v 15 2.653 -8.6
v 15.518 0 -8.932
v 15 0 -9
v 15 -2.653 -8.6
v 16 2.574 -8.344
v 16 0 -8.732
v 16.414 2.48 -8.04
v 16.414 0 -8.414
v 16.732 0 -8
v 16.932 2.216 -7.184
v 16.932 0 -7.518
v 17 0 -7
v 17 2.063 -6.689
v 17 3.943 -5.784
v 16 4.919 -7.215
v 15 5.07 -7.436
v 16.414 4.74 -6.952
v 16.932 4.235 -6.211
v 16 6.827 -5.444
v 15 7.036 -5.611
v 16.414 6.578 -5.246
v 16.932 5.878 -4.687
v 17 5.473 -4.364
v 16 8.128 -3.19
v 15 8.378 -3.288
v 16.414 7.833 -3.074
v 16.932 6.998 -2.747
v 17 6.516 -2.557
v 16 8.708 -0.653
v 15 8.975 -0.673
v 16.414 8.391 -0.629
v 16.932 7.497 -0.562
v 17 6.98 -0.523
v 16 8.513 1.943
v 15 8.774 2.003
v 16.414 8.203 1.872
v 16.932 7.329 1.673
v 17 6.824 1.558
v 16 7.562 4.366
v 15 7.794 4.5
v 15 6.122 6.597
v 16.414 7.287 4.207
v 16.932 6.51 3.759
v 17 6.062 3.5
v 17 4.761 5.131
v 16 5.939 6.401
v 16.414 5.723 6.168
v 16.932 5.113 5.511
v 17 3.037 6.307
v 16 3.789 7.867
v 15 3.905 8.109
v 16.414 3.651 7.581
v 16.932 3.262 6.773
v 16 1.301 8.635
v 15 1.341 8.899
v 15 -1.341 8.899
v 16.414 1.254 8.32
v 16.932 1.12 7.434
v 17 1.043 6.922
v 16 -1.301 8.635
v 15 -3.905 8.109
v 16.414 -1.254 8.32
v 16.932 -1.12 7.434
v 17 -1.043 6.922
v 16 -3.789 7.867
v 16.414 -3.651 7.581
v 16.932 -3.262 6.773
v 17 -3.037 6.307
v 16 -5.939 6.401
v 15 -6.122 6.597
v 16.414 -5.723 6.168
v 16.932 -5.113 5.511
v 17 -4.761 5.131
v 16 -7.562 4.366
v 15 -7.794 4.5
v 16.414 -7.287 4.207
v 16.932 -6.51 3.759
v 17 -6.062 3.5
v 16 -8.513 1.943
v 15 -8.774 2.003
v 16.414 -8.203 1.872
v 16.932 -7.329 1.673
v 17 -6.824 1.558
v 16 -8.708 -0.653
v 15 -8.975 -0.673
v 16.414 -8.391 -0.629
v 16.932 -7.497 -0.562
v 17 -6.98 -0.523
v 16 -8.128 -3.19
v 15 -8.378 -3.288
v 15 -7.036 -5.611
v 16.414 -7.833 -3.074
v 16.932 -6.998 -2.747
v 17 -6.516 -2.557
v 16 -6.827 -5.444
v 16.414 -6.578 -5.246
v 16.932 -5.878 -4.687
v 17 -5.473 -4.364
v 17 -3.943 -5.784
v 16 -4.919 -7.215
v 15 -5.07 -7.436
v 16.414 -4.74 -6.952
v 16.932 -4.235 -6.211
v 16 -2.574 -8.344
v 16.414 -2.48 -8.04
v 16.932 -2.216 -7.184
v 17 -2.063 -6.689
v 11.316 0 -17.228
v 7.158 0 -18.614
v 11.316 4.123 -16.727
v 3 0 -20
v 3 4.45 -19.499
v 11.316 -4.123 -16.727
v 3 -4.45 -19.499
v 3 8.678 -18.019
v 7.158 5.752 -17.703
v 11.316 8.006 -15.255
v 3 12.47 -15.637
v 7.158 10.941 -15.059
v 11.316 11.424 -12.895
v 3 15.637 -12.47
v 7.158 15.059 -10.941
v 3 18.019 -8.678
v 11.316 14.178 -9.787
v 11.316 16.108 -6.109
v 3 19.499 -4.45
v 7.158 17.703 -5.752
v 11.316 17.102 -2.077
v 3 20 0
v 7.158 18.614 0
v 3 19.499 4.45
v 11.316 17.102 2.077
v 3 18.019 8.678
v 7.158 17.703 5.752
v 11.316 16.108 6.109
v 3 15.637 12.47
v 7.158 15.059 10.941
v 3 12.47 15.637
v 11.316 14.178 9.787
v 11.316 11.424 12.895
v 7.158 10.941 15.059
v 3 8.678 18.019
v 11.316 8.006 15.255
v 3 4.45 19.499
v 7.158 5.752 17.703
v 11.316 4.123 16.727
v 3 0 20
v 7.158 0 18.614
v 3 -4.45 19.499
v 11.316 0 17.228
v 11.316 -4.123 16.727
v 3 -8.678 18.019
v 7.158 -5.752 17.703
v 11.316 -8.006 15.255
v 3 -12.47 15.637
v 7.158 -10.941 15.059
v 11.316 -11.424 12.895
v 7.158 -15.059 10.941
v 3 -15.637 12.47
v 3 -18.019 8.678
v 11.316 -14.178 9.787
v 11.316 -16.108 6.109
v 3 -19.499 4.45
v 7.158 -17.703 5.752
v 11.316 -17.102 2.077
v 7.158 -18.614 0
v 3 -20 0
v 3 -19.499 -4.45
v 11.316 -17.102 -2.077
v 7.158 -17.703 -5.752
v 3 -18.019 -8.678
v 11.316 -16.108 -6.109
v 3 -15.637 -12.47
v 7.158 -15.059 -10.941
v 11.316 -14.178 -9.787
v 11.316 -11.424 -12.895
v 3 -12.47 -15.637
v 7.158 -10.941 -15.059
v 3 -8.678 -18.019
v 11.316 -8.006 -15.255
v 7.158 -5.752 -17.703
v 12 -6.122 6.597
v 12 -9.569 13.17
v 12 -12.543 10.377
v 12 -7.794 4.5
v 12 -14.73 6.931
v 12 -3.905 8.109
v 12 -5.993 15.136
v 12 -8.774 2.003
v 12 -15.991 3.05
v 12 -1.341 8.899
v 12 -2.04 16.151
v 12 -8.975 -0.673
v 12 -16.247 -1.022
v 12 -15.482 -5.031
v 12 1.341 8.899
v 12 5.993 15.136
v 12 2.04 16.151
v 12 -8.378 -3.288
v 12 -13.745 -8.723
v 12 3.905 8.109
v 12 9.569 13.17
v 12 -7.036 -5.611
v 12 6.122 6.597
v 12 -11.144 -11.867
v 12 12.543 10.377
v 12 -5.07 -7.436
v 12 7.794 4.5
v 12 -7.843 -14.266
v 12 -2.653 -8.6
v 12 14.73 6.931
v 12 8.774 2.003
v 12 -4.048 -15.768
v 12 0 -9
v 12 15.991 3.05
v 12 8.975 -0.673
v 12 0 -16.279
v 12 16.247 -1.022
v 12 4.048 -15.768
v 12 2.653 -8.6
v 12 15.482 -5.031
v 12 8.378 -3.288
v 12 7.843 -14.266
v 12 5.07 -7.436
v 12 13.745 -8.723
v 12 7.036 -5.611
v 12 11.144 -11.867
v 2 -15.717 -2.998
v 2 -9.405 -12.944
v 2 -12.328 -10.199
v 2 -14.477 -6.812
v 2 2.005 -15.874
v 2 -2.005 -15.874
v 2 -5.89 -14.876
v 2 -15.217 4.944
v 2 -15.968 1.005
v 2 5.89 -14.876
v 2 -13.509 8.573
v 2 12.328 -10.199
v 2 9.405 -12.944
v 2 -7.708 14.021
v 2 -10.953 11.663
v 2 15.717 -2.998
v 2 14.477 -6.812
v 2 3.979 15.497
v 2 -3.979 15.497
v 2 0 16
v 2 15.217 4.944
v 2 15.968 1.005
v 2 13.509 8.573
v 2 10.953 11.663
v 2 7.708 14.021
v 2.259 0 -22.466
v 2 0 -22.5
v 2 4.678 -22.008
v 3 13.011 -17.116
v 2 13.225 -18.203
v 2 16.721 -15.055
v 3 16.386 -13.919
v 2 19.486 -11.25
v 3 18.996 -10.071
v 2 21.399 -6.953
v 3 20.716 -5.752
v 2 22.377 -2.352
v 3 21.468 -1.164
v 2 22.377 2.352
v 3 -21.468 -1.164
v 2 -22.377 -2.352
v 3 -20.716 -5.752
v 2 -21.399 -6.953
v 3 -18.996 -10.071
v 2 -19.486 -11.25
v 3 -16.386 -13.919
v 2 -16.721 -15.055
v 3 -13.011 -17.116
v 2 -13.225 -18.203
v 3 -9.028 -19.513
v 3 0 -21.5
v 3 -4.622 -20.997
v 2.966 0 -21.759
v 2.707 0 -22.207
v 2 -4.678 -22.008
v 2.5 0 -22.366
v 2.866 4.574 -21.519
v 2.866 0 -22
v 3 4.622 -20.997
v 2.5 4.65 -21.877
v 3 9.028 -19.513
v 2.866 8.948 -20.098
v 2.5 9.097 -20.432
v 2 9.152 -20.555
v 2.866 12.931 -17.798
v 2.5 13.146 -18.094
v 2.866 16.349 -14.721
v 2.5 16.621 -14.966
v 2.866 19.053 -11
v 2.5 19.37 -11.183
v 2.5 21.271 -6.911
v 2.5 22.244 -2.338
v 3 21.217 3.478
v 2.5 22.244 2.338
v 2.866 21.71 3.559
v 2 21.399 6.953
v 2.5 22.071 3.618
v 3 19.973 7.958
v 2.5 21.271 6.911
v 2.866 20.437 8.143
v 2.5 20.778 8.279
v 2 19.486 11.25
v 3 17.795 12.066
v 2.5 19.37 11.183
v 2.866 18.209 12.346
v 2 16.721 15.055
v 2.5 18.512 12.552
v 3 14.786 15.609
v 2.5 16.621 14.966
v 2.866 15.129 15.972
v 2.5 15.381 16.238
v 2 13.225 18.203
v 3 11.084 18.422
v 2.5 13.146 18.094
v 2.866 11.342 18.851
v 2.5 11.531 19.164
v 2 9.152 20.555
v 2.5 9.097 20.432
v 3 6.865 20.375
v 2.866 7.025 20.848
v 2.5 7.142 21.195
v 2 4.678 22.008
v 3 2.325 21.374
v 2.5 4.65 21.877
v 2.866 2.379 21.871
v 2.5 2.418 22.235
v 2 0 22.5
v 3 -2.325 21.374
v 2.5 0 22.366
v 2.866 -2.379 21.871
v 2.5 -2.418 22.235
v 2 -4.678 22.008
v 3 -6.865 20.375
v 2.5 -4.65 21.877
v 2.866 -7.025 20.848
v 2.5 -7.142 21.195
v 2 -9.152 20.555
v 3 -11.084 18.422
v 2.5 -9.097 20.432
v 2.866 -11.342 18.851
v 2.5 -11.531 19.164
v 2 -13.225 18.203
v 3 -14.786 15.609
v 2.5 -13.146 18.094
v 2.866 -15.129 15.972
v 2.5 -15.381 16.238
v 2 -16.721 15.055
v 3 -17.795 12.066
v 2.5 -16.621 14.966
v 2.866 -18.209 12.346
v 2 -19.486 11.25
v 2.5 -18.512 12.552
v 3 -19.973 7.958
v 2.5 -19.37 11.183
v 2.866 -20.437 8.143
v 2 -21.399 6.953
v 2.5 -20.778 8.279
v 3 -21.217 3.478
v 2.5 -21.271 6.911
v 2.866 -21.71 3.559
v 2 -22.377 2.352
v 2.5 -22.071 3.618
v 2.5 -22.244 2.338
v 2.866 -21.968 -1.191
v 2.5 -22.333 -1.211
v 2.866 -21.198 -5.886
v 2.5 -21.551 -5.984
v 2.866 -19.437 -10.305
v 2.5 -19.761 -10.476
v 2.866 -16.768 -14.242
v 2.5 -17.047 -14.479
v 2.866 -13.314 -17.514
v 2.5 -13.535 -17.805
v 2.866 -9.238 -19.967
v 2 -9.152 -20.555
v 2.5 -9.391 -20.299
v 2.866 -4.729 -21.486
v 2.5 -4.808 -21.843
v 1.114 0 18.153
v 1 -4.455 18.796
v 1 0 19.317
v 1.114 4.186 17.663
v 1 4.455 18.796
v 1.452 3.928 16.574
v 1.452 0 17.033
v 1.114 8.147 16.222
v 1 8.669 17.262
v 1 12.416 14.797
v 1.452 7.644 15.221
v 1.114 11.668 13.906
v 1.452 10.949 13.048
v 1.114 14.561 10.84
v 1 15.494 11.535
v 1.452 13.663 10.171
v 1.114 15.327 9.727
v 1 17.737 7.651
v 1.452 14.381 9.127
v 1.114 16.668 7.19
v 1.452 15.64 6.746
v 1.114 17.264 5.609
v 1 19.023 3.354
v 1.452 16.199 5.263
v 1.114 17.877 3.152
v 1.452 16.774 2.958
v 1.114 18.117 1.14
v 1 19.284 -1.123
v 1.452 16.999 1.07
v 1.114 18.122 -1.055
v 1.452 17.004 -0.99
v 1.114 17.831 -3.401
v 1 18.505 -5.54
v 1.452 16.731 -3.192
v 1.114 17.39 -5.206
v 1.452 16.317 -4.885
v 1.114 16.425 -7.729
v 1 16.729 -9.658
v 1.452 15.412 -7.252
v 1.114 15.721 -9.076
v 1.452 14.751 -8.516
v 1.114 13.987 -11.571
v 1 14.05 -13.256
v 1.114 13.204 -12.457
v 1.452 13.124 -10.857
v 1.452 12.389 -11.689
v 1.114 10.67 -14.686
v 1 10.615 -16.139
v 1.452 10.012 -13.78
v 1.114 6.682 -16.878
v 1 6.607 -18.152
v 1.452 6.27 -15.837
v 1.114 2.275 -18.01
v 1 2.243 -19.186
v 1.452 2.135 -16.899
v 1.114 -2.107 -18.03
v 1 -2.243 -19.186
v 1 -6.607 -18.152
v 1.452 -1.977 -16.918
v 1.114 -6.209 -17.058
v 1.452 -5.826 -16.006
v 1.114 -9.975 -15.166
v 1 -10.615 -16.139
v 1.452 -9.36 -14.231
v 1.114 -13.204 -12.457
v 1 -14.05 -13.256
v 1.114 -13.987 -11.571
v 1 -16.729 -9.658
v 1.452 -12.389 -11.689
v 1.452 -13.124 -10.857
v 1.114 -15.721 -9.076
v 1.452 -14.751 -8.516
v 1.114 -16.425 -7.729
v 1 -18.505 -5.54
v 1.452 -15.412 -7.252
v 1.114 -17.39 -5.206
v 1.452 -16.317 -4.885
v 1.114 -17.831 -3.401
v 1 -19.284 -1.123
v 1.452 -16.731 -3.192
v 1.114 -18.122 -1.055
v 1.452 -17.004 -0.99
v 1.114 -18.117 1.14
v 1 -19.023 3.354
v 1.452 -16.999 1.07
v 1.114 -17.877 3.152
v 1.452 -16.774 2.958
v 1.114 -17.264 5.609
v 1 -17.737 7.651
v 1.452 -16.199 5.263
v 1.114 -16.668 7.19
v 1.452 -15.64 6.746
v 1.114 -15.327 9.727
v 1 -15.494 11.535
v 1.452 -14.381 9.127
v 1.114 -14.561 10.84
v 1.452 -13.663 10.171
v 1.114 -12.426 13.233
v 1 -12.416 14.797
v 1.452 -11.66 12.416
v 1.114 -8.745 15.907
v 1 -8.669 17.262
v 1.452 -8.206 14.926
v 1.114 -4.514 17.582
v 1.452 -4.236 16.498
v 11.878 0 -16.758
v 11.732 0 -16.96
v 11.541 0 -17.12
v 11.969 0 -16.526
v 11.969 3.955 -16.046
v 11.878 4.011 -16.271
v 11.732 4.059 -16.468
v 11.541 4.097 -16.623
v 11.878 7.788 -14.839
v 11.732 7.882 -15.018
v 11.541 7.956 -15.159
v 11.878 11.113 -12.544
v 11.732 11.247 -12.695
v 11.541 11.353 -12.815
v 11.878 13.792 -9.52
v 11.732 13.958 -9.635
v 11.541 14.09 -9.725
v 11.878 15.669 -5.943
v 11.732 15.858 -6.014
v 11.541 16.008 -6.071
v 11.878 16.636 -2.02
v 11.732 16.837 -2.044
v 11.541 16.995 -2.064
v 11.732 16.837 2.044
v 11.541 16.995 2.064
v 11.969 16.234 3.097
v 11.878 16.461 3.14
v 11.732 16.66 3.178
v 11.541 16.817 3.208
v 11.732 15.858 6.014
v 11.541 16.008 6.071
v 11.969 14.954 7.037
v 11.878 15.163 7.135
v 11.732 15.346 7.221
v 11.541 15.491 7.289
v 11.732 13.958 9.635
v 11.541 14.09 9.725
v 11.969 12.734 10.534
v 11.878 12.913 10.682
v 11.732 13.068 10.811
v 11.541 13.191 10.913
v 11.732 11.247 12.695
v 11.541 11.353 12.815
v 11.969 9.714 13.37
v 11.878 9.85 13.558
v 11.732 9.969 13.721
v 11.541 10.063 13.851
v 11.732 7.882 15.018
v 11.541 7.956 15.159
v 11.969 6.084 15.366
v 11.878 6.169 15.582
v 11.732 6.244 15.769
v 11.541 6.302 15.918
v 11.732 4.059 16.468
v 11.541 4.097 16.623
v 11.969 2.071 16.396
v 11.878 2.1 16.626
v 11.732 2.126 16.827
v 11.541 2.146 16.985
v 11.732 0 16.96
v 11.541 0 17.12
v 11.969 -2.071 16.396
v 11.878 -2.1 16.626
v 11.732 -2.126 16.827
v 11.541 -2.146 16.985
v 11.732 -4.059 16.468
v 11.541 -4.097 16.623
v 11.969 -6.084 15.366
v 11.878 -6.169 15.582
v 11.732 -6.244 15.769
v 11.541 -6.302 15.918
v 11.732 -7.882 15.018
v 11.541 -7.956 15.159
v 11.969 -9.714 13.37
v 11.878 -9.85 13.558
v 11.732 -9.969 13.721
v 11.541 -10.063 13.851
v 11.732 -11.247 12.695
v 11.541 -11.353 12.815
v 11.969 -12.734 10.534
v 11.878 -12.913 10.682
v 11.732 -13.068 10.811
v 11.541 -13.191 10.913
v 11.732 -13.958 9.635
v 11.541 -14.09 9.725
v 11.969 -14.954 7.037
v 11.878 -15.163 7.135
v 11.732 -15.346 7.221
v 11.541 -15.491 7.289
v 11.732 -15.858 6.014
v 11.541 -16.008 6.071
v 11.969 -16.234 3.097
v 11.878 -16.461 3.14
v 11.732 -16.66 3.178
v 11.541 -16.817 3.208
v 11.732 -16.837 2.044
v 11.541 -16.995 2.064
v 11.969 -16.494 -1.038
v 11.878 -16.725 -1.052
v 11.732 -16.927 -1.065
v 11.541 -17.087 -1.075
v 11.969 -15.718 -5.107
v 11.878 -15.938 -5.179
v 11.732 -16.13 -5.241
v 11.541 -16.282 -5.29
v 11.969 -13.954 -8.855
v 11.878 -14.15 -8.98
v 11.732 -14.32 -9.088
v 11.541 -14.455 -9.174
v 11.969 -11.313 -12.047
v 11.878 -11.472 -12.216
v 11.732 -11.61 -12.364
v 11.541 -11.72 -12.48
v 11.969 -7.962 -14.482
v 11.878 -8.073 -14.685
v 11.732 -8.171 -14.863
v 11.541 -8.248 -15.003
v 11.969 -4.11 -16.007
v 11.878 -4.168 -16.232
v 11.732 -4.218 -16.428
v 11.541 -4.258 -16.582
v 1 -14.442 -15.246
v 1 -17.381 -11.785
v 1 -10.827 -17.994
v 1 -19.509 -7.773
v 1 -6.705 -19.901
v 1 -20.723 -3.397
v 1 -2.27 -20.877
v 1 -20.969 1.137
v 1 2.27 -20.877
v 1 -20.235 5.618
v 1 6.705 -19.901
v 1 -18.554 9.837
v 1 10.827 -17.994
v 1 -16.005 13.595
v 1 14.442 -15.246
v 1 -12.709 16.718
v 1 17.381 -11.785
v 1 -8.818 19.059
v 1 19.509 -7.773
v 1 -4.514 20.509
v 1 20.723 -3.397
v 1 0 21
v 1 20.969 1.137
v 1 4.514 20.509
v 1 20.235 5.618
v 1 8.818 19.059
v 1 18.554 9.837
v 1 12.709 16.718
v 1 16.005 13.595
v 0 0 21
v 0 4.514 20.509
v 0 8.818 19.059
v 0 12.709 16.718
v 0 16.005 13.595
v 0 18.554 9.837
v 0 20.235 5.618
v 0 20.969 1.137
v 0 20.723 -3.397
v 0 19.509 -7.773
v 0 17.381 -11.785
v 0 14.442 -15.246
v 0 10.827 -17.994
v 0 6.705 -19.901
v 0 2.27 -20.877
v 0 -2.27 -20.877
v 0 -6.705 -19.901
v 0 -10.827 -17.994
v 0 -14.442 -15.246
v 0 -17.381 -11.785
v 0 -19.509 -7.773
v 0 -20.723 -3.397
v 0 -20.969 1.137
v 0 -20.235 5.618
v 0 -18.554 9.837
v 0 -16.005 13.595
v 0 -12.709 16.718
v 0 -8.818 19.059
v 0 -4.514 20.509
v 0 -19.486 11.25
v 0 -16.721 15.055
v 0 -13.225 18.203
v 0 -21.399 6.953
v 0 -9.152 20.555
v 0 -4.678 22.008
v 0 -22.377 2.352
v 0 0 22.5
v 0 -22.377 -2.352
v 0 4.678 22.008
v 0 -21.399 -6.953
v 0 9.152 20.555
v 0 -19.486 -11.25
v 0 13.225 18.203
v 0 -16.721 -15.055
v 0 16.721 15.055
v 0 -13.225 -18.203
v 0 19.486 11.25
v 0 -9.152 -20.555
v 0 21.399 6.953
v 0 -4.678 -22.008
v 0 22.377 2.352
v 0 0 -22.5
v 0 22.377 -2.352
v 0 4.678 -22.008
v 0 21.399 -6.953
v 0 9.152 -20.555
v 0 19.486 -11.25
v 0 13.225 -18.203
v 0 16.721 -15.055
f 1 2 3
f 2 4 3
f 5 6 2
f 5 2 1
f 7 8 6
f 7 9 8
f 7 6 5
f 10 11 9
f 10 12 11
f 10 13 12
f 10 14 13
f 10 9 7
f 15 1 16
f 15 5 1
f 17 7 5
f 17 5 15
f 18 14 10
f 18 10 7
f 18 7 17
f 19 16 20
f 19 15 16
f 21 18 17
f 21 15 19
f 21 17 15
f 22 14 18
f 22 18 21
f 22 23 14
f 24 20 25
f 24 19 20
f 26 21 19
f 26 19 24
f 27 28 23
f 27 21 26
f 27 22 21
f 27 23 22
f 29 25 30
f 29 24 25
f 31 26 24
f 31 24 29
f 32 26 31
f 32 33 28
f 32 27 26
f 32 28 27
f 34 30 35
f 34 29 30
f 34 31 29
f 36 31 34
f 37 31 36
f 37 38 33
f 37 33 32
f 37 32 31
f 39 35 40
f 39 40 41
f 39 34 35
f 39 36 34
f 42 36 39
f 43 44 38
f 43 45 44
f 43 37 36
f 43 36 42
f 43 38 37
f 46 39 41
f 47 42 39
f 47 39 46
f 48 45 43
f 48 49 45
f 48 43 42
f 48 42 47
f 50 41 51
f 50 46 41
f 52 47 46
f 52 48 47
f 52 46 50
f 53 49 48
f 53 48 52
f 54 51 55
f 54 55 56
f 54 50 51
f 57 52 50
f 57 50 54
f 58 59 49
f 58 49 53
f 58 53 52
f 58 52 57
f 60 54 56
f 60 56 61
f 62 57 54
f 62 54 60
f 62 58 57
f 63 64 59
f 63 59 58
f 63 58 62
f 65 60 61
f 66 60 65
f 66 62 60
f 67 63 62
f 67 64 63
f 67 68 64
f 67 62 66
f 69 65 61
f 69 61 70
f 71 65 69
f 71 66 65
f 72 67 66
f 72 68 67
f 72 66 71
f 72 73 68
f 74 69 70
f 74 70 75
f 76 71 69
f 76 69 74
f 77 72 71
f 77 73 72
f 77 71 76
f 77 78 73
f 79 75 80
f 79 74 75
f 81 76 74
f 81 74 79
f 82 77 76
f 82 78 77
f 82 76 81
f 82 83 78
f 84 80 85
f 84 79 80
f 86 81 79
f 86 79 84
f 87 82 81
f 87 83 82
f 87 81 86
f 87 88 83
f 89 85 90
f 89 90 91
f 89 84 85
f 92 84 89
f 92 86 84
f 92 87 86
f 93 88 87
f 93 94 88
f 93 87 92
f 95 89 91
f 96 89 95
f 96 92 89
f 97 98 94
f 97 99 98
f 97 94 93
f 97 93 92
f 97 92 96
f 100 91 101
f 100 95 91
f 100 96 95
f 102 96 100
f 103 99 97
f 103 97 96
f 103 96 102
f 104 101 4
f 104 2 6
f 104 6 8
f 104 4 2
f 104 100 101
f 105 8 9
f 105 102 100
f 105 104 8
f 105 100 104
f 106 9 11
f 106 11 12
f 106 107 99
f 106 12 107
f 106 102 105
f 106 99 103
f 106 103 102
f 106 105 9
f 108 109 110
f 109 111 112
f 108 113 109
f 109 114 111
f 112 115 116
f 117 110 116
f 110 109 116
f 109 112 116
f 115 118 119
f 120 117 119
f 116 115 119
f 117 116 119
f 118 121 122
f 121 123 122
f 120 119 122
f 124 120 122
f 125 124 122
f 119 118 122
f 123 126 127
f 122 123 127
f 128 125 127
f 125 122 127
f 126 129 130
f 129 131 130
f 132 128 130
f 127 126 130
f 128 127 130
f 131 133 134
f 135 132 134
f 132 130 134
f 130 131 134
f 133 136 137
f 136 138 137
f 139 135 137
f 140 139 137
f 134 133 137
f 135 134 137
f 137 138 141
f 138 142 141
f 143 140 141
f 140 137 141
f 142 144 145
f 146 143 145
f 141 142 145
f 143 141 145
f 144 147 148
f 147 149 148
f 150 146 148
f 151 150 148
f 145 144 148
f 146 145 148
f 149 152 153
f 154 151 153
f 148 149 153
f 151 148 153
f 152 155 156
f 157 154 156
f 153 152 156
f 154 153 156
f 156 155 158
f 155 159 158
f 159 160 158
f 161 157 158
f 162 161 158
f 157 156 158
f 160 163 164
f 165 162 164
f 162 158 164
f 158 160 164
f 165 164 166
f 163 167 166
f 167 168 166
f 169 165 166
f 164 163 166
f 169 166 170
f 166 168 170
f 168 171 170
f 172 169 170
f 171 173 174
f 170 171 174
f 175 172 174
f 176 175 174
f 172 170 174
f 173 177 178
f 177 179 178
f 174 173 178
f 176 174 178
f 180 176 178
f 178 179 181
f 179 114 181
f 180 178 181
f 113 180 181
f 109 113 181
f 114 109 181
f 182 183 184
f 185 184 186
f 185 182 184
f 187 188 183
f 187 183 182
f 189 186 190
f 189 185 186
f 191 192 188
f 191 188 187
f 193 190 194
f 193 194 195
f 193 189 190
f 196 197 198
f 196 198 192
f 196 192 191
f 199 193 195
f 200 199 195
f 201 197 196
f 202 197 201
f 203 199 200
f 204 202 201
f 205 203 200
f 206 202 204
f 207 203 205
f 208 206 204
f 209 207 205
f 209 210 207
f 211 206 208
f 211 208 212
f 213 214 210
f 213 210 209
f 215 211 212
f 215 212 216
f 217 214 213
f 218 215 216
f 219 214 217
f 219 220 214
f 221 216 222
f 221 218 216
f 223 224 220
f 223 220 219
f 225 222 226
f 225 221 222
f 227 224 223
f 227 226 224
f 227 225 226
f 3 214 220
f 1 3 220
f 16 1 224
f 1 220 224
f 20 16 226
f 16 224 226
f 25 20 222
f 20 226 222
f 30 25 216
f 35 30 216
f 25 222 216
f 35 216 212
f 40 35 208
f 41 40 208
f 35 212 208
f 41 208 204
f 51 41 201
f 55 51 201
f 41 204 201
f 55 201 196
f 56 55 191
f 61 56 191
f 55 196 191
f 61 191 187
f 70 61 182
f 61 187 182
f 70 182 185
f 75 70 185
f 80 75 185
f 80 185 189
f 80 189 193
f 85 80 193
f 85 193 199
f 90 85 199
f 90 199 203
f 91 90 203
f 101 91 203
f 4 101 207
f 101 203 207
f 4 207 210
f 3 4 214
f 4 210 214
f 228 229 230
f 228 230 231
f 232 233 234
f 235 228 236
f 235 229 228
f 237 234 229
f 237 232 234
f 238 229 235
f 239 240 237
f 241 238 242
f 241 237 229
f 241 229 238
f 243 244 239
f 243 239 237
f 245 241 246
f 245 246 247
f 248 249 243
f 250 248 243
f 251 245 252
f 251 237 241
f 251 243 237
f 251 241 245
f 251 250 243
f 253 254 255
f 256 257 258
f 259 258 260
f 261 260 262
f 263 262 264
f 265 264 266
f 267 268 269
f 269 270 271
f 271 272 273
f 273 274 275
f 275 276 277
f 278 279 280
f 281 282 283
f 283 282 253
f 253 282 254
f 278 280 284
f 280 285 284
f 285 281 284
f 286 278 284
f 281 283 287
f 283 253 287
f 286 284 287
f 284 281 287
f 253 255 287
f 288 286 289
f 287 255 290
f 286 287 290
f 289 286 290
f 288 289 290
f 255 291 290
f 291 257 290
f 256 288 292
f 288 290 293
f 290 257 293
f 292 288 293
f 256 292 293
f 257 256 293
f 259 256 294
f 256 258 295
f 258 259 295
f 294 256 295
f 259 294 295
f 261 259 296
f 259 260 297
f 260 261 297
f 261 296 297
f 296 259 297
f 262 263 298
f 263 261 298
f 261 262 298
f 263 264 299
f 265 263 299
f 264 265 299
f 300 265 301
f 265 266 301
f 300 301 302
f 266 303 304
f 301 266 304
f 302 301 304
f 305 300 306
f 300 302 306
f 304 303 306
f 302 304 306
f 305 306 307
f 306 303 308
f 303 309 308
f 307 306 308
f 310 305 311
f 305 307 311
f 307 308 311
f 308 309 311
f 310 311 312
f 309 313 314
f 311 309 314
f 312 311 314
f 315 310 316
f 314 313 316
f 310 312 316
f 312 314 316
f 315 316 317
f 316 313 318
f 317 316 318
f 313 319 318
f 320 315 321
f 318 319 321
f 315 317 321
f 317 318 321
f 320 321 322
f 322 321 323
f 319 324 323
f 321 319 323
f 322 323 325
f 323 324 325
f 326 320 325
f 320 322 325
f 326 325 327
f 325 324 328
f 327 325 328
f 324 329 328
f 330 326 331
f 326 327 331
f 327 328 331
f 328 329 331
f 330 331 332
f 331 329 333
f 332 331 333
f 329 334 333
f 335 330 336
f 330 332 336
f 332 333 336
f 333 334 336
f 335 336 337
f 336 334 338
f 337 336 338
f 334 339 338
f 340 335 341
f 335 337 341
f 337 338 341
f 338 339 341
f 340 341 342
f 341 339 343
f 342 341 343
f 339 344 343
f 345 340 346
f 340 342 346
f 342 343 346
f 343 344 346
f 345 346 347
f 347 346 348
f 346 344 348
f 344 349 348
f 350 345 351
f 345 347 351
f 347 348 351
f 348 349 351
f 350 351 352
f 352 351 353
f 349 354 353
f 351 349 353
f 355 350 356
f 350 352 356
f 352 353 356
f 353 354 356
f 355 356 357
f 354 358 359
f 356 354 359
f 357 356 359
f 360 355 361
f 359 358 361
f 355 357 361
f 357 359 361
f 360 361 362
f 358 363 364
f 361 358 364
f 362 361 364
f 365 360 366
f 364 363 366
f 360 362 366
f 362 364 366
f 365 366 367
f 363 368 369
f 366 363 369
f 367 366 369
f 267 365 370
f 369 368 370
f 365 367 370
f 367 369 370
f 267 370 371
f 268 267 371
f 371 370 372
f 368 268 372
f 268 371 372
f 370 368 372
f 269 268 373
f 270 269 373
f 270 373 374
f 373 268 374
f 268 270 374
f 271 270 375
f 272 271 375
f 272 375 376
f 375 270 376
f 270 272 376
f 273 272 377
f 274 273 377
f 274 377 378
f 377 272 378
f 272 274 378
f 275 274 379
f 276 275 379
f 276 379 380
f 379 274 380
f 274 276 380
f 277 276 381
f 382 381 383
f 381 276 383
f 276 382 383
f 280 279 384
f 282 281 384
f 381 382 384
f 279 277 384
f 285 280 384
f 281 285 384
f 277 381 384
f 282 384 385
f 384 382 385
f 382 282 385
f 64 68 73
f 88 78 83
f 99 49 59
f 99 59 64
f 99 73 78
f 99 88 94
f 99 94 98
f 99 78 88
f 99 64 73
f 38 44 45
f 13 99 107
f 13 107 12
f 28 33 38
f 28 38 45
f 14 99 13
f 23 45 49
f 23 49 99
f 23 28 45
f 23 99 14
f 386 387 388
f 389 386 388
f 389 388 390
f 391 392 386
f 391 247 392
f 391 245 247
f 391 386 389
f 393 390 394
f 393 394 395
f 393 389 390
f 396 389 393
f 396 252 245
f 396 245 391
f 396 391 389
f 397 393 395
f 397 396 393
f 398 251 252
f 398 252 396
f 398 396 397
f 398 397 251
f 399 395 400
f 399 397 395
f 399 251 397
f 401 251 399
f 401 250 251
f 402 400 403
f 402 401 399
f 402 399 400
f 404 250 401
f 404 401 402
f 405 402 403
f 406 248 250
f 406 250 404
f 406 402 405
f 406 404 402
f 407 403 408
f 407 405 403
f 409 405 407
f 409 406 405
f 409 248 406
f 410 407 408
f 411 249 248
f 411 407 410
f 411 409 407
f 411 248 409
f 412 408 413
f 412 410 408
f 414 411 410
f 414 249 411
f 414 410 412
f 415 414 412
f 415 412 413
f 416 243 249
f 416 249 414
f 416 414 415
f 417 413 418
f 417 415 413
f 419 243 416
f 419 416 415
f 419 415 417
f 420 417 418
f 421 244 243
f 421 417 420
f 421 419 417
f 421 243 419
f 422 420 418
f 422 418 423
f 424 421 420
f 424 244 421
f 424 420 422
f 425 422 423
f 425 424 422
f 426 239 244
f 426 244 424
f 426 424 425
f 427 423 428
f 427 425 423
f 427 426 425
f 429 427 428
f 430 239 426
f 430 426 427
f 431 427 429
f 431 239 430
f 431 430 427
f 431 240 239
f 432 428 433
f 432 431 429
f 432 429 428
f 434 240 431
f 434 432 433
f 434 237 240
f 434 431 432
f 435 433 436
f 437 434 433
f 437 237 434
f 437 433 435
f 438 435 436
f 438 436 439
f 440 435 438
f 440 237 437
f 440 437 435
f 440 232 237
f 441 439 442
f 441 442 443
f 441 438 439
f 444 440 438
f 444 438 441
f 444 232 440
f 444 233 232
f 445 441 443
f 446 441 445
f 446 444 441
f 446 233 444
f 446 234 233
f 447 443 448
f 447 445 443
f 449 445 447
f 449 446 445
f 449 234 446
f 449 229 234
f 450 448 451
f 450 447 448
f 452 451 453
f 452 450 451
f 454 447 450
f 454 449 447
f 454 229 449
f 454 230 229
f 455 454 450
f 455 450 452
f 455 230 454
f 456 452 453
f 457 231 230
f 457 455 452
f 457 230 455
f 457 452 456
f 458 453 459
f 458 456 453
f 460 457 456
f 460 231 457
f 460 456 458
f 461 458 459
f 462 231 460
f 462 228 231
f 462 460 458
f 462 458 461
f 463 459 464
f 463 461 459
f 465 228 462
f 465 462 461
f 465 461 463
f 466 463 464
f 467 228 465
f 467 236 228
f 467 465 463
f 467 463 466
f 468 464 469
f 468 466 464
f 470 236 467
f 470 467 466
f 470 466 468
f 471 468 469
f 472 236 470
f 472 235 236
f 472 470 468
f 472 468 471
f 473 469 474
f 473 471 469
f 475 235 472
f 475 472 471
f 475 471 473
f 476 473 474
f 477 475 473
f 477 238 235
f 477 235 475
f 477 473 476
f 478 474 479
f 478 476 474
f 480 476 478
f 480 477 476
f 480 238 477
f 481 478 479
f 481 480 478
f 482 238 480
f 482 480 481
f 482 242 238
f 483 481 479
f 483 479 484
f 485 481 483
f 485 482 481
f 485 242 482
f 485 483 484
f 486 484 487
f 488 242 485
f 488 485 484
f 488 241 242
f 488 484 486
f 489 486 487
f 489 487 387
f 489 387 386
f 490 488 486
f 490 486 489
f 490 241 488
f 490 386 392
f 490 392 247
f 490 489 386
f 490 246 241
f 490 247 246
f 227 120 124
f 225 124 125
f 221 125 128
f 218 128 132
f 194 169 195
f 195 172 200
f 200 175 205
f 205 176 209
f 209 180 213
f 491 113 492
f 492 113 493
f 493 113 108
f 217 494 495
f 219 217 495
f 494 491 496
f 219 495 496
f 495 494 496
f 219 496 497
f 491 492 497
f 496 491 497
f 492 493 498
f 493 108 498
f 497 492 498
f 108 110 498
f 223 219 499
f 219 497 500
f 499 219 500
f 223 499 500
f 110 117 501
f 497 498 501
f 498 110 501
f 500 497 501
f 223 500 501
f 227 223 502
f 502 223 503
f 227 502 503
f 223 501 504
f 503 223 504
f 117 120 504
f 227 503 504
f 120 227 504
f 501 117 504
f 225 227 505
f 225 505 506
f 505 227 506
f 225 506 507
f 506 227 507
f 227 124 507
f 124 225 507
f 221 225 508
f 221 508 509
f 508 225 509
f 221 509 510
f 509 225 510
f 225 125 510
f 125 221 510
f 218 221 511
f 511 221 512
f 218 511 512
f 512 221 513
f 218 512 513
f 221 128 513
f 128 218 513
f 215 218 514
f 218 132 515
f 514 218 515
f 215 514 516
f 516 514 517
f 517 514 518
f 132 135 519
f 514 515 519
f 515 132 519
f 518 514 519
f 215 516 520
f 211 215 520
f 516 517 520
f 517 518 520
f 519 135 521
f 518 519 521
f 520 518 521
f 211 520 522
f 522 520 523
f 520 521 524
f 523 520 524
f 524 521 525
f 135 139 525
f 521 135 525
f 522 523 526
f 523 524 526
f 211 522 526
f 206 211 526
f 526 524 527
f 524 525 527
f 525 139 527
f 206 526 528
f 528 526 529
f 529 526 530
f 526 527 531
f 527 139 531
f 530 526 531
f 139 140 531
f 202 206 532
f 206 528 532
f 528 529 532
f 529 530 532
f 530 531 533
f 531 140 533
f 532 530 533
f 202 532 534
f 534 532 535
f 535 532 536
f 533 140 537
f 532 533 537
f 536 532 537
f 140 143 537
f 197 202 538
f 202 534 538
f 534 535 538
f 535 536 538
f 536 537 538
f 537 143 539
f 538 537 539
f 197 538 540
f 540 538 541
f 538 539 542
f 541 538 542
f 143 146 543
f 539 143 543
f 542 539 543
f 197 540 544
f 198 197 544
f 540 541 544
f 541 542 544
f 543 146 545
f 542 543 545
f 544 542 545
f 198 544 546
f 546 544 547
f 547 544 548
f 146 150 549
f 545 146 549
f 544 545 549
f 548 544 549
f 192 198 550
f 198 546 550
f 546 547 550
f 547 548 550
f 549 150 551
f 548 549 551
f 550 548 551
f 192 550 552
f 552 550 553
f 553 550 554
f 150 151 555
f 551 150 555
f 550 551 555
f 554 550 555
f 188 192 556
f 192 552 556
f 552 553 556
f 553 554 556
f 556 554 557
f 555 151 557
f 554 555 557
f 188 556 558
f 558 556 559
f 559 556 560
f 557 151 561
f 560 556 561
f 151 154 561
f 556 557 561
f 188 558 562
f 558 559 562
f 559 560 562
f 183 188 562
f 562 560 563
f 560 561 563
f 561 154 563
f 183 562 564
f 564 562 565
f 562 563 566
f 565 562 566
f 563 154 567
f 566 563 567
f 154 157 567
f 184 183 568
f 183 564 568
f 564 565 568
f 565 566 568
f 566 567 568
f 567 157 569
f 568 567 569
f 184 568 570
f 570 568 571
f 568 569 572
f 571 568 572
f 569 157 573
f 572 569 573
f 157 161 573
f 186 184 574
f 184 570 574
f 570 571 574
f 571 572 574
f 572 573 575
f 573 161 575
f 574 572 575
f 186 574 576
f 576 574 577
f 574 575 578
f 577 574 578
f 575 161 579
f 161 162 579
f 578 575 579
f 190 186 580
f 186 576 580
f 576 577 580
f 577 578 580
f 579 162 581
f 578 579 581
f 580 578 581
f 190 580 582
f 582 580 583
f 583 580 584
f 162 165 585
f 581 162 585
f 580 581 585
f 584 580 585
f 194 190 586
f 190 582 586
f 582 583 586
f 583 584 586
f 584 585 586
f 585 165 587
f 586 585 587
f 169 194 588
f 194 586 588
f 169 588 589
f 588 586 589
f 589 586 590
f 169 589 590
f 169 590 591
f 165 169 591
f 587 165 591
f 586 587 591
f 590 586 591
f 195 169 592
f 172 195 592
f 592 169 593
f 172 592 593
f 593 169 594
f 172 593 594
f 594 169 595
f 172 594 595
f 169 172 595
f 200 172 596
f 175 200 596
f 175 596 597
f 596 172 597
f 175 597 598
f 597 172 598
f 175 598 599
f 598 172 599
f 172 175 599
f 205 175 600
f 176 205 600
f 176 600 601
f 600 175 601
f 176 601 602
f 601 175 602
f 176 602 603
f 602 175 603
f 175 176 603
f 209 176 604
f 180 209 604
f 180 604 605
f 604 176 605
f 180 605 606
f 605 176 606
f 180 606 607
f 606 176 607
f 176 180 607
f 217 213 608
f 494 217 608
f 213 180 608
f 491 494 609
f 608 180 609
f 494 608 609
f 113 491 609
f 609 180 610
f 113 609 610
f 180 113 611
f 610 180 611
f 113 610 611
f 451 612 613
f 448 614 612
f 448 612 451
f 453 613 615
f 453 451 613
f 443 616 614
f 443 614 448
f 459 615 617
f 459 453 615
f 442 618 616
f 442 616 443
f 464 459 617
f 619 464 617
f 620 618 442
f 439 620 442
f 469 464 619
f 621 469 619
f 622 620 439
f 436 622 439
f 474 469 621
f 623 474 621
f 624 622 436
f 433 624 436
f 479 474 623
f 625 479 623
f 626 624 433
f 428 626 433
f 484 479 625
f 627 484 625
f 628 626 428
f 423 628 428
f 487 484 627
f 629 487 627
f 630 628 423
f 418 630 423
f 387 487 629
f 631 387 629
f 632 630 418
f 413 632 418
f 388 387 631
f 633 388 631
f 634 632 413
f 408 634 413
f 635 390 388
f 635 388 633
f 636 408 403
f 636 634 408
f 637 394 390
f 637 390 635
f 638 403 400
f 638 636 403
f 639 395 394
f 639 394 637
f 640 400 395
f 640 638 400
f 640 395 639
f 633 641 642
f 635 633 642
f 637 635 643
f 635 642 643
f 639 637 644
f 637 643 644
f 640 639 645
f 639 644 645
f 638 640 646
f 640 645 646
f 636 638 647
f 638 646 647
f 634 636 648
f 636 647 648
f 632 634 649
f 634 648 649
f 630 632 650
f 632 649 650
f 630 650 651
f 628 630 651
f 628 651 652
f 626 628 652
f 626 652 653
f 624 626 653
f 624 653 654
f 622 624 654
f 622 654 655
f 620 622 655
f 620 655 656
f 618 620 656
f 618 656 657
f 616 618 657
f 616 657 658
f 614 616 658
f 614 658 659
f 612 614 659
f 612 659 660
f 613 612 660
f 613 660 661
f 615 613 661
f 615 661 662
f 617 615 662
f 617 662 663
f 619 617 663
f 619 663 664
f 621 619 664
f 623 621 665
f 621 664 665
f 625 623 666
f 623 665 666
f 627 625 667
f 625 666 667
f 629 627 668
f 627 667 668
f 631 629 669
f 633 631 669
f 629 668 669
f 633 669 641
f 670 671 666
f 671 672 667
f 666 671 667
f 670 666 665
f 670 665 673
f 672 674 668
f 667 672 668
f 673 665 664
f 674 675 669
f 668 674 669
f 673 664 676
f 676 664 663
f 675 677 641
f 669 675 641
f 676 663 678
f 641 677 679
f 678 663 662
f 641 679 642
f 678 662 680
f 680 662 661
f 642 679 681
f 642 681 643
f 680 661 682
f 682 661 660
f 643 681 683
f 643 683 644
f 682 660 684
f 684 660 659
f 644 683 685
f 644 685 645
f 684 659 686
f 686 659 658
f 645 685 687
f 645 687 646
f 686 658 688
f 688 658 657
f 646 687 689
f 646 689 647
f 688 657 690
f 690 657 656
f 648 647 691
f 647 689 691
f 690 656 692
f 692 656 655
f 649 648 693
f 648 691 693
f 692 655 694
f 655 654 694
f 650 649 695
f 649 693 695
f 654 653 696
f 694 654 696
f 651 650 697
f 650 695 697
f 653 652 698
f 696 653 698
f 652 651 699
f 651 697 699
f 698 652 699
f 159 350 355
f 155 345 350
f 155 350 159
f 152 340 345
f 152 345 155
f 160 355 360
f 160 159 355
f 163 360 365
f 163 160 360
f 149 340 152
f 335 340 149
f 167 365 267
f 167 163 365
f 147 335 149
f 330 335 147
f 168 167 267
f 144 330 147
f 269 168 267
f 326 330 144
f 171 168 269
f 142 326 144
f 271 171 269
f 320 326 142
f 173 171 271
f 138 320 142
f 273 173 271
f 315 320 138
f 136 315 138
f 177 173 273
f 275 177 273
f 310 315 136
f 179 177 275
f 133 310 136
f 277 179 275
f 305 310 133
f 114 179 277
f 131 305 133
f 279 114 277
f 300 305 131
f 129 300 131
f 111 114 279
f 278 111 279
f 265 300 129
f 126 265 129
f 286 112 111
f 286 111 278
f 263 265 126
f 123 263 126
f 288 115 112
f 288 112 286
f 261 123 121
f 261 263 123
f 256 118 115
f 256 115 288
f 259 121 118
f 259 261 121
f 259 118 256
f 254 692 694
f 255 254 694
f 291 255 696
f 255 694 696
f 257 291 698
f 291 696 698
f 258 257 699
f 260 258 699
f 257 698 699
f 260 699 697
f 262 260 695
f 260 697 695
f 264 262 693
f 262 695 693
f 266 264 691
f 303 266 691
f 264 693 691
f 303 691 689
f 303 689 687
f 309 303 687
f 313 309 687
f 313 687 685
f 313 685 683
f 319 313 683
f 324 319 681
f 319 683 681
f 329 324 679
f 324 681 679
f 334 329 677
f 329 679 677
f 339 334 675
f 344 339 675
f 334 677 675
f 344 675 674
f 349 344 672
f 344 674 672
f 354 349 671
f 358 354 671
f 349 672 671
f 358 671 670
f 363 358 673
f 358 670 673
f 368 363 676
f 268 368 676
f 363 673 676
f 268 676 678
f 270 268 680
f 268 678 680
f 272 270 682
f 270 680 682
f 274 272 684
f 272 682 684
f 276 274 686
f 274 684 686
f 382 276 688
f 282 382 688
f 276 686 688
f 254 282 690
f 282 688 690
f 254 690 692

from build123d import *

# Parameters (mm, degrees)
SKETCH1_R           = 22.5
BOSS_EXTRUDE1_DEPTH = 3
SKETCH3_R           = 17
SKETCH2_R           = 20
SKETCH4_R           = 9
BOSS_EXTRUDE2_DEPTH = 5
FILLET1_R           = 2
FILLET2_R           = 1
SKETCH5_R           = 21
CUT_EXTRUDE1_DEPTH  = 2
BOSS_EXTRUDE3_START = 1
SKETCH6_R           = 21
SKETCH6_R_2         = 16
BOSS_EXTRUDE3_DEPTH = 1
FILLET3_R           = 6


with BuildPart() as part:
    # Sketch1 → Boss-Extrude1 (new body)
    with BuildSketch(Plane(origin=(0, 0, 0), x_dir=(0, 0, -1), z_dir=(1, 0, 0))):
        Circle(SKETCH1_R)
    extrude(amount=BOSS_EXTRUDE1_DEPTH)

    # Sketch3 → Loft1 section 0
    with BuildSketch(Plane(origin=(12, 0, 0), x_dir=(0, 0, -1), z_dir=(1, 0, 0))):
        Circle(SKETCH3_R)
    # Sketch2 → Loft1 section 1
    with BuildSketch(Plane(origin=(3, 0, 0), x_dir=(0, 0, -1), z_dir=(1, 0, 0))):
        Circle(SKETCH2_R)
    loft()

    # Sketch4 → Boss-Extrude2 (add)
    with BuildSketch(Plane(origin=(12, 0, 0), x_dir=(0, 0, -1), z_dir=(1, 0, 0))):
        Circle(SKETCH4_R)
    extrude(amount=BOSS_EXTRUDE2_DEPTH)

    # Fillet1
    fillet1_edges = [part.edges().sort_by_distance(p)[0] for p in [
        (17, 0, 9),
    ]]
    fillet(fillet1_edges, radius=FILLET1_R)

    # Fillet2
    fillet2_edges = [part.edges().sort_by_distance(p)[0] for p in [
        (3, 0, 22.5),
        (12, 0, 17),
    ]]
    fillet(fillet2_edges, radius=FILLET2_R)

    # Sketch5 → Cut-Extrude1 (cut)
    with BuildSketch(Plane.ZY):
        Circle(SKETCH5_R)
    extrude(amount=-CUT_EXTRUDE1_DEPTH, mode=Mode.SUBTRACT)

    # Sketch6 → Boss-Extrude3 (add)
    with BuildSketch(Plane.ZY.offset(-2).offset(BOSS_EXTRUDE3_START)):
        Circle(SKETCH6_R)
        Circle(SKETCH6_R_2, mode=Mode.SUBTRACT)
    extrude(amount=-BOSS_EXTRUDE3_DEPTH)

    # Fillet3
    # the kernel refuses this fillet: 6 mm, written as the material it takes off along each edge
    with BuildSketch(Plane(origin=(1, 0, 0), x_dir=(0, 0, 1), z_dir=(0, -1, 0))) as fillet3_piece_1:
        with BuildLine():
            CenterArc((19.31662479, -6), FILLET3_R, 90, 33.557309762)
            Line((16, -1), (16, 0))
            Line((16, 0), (19.31662479, 0))
        make_face()
    revolve(axis=Axis((1, 0, 0), (-1, 0, 0)), mode=Mode.SUBTRACT)


solid = part.part
